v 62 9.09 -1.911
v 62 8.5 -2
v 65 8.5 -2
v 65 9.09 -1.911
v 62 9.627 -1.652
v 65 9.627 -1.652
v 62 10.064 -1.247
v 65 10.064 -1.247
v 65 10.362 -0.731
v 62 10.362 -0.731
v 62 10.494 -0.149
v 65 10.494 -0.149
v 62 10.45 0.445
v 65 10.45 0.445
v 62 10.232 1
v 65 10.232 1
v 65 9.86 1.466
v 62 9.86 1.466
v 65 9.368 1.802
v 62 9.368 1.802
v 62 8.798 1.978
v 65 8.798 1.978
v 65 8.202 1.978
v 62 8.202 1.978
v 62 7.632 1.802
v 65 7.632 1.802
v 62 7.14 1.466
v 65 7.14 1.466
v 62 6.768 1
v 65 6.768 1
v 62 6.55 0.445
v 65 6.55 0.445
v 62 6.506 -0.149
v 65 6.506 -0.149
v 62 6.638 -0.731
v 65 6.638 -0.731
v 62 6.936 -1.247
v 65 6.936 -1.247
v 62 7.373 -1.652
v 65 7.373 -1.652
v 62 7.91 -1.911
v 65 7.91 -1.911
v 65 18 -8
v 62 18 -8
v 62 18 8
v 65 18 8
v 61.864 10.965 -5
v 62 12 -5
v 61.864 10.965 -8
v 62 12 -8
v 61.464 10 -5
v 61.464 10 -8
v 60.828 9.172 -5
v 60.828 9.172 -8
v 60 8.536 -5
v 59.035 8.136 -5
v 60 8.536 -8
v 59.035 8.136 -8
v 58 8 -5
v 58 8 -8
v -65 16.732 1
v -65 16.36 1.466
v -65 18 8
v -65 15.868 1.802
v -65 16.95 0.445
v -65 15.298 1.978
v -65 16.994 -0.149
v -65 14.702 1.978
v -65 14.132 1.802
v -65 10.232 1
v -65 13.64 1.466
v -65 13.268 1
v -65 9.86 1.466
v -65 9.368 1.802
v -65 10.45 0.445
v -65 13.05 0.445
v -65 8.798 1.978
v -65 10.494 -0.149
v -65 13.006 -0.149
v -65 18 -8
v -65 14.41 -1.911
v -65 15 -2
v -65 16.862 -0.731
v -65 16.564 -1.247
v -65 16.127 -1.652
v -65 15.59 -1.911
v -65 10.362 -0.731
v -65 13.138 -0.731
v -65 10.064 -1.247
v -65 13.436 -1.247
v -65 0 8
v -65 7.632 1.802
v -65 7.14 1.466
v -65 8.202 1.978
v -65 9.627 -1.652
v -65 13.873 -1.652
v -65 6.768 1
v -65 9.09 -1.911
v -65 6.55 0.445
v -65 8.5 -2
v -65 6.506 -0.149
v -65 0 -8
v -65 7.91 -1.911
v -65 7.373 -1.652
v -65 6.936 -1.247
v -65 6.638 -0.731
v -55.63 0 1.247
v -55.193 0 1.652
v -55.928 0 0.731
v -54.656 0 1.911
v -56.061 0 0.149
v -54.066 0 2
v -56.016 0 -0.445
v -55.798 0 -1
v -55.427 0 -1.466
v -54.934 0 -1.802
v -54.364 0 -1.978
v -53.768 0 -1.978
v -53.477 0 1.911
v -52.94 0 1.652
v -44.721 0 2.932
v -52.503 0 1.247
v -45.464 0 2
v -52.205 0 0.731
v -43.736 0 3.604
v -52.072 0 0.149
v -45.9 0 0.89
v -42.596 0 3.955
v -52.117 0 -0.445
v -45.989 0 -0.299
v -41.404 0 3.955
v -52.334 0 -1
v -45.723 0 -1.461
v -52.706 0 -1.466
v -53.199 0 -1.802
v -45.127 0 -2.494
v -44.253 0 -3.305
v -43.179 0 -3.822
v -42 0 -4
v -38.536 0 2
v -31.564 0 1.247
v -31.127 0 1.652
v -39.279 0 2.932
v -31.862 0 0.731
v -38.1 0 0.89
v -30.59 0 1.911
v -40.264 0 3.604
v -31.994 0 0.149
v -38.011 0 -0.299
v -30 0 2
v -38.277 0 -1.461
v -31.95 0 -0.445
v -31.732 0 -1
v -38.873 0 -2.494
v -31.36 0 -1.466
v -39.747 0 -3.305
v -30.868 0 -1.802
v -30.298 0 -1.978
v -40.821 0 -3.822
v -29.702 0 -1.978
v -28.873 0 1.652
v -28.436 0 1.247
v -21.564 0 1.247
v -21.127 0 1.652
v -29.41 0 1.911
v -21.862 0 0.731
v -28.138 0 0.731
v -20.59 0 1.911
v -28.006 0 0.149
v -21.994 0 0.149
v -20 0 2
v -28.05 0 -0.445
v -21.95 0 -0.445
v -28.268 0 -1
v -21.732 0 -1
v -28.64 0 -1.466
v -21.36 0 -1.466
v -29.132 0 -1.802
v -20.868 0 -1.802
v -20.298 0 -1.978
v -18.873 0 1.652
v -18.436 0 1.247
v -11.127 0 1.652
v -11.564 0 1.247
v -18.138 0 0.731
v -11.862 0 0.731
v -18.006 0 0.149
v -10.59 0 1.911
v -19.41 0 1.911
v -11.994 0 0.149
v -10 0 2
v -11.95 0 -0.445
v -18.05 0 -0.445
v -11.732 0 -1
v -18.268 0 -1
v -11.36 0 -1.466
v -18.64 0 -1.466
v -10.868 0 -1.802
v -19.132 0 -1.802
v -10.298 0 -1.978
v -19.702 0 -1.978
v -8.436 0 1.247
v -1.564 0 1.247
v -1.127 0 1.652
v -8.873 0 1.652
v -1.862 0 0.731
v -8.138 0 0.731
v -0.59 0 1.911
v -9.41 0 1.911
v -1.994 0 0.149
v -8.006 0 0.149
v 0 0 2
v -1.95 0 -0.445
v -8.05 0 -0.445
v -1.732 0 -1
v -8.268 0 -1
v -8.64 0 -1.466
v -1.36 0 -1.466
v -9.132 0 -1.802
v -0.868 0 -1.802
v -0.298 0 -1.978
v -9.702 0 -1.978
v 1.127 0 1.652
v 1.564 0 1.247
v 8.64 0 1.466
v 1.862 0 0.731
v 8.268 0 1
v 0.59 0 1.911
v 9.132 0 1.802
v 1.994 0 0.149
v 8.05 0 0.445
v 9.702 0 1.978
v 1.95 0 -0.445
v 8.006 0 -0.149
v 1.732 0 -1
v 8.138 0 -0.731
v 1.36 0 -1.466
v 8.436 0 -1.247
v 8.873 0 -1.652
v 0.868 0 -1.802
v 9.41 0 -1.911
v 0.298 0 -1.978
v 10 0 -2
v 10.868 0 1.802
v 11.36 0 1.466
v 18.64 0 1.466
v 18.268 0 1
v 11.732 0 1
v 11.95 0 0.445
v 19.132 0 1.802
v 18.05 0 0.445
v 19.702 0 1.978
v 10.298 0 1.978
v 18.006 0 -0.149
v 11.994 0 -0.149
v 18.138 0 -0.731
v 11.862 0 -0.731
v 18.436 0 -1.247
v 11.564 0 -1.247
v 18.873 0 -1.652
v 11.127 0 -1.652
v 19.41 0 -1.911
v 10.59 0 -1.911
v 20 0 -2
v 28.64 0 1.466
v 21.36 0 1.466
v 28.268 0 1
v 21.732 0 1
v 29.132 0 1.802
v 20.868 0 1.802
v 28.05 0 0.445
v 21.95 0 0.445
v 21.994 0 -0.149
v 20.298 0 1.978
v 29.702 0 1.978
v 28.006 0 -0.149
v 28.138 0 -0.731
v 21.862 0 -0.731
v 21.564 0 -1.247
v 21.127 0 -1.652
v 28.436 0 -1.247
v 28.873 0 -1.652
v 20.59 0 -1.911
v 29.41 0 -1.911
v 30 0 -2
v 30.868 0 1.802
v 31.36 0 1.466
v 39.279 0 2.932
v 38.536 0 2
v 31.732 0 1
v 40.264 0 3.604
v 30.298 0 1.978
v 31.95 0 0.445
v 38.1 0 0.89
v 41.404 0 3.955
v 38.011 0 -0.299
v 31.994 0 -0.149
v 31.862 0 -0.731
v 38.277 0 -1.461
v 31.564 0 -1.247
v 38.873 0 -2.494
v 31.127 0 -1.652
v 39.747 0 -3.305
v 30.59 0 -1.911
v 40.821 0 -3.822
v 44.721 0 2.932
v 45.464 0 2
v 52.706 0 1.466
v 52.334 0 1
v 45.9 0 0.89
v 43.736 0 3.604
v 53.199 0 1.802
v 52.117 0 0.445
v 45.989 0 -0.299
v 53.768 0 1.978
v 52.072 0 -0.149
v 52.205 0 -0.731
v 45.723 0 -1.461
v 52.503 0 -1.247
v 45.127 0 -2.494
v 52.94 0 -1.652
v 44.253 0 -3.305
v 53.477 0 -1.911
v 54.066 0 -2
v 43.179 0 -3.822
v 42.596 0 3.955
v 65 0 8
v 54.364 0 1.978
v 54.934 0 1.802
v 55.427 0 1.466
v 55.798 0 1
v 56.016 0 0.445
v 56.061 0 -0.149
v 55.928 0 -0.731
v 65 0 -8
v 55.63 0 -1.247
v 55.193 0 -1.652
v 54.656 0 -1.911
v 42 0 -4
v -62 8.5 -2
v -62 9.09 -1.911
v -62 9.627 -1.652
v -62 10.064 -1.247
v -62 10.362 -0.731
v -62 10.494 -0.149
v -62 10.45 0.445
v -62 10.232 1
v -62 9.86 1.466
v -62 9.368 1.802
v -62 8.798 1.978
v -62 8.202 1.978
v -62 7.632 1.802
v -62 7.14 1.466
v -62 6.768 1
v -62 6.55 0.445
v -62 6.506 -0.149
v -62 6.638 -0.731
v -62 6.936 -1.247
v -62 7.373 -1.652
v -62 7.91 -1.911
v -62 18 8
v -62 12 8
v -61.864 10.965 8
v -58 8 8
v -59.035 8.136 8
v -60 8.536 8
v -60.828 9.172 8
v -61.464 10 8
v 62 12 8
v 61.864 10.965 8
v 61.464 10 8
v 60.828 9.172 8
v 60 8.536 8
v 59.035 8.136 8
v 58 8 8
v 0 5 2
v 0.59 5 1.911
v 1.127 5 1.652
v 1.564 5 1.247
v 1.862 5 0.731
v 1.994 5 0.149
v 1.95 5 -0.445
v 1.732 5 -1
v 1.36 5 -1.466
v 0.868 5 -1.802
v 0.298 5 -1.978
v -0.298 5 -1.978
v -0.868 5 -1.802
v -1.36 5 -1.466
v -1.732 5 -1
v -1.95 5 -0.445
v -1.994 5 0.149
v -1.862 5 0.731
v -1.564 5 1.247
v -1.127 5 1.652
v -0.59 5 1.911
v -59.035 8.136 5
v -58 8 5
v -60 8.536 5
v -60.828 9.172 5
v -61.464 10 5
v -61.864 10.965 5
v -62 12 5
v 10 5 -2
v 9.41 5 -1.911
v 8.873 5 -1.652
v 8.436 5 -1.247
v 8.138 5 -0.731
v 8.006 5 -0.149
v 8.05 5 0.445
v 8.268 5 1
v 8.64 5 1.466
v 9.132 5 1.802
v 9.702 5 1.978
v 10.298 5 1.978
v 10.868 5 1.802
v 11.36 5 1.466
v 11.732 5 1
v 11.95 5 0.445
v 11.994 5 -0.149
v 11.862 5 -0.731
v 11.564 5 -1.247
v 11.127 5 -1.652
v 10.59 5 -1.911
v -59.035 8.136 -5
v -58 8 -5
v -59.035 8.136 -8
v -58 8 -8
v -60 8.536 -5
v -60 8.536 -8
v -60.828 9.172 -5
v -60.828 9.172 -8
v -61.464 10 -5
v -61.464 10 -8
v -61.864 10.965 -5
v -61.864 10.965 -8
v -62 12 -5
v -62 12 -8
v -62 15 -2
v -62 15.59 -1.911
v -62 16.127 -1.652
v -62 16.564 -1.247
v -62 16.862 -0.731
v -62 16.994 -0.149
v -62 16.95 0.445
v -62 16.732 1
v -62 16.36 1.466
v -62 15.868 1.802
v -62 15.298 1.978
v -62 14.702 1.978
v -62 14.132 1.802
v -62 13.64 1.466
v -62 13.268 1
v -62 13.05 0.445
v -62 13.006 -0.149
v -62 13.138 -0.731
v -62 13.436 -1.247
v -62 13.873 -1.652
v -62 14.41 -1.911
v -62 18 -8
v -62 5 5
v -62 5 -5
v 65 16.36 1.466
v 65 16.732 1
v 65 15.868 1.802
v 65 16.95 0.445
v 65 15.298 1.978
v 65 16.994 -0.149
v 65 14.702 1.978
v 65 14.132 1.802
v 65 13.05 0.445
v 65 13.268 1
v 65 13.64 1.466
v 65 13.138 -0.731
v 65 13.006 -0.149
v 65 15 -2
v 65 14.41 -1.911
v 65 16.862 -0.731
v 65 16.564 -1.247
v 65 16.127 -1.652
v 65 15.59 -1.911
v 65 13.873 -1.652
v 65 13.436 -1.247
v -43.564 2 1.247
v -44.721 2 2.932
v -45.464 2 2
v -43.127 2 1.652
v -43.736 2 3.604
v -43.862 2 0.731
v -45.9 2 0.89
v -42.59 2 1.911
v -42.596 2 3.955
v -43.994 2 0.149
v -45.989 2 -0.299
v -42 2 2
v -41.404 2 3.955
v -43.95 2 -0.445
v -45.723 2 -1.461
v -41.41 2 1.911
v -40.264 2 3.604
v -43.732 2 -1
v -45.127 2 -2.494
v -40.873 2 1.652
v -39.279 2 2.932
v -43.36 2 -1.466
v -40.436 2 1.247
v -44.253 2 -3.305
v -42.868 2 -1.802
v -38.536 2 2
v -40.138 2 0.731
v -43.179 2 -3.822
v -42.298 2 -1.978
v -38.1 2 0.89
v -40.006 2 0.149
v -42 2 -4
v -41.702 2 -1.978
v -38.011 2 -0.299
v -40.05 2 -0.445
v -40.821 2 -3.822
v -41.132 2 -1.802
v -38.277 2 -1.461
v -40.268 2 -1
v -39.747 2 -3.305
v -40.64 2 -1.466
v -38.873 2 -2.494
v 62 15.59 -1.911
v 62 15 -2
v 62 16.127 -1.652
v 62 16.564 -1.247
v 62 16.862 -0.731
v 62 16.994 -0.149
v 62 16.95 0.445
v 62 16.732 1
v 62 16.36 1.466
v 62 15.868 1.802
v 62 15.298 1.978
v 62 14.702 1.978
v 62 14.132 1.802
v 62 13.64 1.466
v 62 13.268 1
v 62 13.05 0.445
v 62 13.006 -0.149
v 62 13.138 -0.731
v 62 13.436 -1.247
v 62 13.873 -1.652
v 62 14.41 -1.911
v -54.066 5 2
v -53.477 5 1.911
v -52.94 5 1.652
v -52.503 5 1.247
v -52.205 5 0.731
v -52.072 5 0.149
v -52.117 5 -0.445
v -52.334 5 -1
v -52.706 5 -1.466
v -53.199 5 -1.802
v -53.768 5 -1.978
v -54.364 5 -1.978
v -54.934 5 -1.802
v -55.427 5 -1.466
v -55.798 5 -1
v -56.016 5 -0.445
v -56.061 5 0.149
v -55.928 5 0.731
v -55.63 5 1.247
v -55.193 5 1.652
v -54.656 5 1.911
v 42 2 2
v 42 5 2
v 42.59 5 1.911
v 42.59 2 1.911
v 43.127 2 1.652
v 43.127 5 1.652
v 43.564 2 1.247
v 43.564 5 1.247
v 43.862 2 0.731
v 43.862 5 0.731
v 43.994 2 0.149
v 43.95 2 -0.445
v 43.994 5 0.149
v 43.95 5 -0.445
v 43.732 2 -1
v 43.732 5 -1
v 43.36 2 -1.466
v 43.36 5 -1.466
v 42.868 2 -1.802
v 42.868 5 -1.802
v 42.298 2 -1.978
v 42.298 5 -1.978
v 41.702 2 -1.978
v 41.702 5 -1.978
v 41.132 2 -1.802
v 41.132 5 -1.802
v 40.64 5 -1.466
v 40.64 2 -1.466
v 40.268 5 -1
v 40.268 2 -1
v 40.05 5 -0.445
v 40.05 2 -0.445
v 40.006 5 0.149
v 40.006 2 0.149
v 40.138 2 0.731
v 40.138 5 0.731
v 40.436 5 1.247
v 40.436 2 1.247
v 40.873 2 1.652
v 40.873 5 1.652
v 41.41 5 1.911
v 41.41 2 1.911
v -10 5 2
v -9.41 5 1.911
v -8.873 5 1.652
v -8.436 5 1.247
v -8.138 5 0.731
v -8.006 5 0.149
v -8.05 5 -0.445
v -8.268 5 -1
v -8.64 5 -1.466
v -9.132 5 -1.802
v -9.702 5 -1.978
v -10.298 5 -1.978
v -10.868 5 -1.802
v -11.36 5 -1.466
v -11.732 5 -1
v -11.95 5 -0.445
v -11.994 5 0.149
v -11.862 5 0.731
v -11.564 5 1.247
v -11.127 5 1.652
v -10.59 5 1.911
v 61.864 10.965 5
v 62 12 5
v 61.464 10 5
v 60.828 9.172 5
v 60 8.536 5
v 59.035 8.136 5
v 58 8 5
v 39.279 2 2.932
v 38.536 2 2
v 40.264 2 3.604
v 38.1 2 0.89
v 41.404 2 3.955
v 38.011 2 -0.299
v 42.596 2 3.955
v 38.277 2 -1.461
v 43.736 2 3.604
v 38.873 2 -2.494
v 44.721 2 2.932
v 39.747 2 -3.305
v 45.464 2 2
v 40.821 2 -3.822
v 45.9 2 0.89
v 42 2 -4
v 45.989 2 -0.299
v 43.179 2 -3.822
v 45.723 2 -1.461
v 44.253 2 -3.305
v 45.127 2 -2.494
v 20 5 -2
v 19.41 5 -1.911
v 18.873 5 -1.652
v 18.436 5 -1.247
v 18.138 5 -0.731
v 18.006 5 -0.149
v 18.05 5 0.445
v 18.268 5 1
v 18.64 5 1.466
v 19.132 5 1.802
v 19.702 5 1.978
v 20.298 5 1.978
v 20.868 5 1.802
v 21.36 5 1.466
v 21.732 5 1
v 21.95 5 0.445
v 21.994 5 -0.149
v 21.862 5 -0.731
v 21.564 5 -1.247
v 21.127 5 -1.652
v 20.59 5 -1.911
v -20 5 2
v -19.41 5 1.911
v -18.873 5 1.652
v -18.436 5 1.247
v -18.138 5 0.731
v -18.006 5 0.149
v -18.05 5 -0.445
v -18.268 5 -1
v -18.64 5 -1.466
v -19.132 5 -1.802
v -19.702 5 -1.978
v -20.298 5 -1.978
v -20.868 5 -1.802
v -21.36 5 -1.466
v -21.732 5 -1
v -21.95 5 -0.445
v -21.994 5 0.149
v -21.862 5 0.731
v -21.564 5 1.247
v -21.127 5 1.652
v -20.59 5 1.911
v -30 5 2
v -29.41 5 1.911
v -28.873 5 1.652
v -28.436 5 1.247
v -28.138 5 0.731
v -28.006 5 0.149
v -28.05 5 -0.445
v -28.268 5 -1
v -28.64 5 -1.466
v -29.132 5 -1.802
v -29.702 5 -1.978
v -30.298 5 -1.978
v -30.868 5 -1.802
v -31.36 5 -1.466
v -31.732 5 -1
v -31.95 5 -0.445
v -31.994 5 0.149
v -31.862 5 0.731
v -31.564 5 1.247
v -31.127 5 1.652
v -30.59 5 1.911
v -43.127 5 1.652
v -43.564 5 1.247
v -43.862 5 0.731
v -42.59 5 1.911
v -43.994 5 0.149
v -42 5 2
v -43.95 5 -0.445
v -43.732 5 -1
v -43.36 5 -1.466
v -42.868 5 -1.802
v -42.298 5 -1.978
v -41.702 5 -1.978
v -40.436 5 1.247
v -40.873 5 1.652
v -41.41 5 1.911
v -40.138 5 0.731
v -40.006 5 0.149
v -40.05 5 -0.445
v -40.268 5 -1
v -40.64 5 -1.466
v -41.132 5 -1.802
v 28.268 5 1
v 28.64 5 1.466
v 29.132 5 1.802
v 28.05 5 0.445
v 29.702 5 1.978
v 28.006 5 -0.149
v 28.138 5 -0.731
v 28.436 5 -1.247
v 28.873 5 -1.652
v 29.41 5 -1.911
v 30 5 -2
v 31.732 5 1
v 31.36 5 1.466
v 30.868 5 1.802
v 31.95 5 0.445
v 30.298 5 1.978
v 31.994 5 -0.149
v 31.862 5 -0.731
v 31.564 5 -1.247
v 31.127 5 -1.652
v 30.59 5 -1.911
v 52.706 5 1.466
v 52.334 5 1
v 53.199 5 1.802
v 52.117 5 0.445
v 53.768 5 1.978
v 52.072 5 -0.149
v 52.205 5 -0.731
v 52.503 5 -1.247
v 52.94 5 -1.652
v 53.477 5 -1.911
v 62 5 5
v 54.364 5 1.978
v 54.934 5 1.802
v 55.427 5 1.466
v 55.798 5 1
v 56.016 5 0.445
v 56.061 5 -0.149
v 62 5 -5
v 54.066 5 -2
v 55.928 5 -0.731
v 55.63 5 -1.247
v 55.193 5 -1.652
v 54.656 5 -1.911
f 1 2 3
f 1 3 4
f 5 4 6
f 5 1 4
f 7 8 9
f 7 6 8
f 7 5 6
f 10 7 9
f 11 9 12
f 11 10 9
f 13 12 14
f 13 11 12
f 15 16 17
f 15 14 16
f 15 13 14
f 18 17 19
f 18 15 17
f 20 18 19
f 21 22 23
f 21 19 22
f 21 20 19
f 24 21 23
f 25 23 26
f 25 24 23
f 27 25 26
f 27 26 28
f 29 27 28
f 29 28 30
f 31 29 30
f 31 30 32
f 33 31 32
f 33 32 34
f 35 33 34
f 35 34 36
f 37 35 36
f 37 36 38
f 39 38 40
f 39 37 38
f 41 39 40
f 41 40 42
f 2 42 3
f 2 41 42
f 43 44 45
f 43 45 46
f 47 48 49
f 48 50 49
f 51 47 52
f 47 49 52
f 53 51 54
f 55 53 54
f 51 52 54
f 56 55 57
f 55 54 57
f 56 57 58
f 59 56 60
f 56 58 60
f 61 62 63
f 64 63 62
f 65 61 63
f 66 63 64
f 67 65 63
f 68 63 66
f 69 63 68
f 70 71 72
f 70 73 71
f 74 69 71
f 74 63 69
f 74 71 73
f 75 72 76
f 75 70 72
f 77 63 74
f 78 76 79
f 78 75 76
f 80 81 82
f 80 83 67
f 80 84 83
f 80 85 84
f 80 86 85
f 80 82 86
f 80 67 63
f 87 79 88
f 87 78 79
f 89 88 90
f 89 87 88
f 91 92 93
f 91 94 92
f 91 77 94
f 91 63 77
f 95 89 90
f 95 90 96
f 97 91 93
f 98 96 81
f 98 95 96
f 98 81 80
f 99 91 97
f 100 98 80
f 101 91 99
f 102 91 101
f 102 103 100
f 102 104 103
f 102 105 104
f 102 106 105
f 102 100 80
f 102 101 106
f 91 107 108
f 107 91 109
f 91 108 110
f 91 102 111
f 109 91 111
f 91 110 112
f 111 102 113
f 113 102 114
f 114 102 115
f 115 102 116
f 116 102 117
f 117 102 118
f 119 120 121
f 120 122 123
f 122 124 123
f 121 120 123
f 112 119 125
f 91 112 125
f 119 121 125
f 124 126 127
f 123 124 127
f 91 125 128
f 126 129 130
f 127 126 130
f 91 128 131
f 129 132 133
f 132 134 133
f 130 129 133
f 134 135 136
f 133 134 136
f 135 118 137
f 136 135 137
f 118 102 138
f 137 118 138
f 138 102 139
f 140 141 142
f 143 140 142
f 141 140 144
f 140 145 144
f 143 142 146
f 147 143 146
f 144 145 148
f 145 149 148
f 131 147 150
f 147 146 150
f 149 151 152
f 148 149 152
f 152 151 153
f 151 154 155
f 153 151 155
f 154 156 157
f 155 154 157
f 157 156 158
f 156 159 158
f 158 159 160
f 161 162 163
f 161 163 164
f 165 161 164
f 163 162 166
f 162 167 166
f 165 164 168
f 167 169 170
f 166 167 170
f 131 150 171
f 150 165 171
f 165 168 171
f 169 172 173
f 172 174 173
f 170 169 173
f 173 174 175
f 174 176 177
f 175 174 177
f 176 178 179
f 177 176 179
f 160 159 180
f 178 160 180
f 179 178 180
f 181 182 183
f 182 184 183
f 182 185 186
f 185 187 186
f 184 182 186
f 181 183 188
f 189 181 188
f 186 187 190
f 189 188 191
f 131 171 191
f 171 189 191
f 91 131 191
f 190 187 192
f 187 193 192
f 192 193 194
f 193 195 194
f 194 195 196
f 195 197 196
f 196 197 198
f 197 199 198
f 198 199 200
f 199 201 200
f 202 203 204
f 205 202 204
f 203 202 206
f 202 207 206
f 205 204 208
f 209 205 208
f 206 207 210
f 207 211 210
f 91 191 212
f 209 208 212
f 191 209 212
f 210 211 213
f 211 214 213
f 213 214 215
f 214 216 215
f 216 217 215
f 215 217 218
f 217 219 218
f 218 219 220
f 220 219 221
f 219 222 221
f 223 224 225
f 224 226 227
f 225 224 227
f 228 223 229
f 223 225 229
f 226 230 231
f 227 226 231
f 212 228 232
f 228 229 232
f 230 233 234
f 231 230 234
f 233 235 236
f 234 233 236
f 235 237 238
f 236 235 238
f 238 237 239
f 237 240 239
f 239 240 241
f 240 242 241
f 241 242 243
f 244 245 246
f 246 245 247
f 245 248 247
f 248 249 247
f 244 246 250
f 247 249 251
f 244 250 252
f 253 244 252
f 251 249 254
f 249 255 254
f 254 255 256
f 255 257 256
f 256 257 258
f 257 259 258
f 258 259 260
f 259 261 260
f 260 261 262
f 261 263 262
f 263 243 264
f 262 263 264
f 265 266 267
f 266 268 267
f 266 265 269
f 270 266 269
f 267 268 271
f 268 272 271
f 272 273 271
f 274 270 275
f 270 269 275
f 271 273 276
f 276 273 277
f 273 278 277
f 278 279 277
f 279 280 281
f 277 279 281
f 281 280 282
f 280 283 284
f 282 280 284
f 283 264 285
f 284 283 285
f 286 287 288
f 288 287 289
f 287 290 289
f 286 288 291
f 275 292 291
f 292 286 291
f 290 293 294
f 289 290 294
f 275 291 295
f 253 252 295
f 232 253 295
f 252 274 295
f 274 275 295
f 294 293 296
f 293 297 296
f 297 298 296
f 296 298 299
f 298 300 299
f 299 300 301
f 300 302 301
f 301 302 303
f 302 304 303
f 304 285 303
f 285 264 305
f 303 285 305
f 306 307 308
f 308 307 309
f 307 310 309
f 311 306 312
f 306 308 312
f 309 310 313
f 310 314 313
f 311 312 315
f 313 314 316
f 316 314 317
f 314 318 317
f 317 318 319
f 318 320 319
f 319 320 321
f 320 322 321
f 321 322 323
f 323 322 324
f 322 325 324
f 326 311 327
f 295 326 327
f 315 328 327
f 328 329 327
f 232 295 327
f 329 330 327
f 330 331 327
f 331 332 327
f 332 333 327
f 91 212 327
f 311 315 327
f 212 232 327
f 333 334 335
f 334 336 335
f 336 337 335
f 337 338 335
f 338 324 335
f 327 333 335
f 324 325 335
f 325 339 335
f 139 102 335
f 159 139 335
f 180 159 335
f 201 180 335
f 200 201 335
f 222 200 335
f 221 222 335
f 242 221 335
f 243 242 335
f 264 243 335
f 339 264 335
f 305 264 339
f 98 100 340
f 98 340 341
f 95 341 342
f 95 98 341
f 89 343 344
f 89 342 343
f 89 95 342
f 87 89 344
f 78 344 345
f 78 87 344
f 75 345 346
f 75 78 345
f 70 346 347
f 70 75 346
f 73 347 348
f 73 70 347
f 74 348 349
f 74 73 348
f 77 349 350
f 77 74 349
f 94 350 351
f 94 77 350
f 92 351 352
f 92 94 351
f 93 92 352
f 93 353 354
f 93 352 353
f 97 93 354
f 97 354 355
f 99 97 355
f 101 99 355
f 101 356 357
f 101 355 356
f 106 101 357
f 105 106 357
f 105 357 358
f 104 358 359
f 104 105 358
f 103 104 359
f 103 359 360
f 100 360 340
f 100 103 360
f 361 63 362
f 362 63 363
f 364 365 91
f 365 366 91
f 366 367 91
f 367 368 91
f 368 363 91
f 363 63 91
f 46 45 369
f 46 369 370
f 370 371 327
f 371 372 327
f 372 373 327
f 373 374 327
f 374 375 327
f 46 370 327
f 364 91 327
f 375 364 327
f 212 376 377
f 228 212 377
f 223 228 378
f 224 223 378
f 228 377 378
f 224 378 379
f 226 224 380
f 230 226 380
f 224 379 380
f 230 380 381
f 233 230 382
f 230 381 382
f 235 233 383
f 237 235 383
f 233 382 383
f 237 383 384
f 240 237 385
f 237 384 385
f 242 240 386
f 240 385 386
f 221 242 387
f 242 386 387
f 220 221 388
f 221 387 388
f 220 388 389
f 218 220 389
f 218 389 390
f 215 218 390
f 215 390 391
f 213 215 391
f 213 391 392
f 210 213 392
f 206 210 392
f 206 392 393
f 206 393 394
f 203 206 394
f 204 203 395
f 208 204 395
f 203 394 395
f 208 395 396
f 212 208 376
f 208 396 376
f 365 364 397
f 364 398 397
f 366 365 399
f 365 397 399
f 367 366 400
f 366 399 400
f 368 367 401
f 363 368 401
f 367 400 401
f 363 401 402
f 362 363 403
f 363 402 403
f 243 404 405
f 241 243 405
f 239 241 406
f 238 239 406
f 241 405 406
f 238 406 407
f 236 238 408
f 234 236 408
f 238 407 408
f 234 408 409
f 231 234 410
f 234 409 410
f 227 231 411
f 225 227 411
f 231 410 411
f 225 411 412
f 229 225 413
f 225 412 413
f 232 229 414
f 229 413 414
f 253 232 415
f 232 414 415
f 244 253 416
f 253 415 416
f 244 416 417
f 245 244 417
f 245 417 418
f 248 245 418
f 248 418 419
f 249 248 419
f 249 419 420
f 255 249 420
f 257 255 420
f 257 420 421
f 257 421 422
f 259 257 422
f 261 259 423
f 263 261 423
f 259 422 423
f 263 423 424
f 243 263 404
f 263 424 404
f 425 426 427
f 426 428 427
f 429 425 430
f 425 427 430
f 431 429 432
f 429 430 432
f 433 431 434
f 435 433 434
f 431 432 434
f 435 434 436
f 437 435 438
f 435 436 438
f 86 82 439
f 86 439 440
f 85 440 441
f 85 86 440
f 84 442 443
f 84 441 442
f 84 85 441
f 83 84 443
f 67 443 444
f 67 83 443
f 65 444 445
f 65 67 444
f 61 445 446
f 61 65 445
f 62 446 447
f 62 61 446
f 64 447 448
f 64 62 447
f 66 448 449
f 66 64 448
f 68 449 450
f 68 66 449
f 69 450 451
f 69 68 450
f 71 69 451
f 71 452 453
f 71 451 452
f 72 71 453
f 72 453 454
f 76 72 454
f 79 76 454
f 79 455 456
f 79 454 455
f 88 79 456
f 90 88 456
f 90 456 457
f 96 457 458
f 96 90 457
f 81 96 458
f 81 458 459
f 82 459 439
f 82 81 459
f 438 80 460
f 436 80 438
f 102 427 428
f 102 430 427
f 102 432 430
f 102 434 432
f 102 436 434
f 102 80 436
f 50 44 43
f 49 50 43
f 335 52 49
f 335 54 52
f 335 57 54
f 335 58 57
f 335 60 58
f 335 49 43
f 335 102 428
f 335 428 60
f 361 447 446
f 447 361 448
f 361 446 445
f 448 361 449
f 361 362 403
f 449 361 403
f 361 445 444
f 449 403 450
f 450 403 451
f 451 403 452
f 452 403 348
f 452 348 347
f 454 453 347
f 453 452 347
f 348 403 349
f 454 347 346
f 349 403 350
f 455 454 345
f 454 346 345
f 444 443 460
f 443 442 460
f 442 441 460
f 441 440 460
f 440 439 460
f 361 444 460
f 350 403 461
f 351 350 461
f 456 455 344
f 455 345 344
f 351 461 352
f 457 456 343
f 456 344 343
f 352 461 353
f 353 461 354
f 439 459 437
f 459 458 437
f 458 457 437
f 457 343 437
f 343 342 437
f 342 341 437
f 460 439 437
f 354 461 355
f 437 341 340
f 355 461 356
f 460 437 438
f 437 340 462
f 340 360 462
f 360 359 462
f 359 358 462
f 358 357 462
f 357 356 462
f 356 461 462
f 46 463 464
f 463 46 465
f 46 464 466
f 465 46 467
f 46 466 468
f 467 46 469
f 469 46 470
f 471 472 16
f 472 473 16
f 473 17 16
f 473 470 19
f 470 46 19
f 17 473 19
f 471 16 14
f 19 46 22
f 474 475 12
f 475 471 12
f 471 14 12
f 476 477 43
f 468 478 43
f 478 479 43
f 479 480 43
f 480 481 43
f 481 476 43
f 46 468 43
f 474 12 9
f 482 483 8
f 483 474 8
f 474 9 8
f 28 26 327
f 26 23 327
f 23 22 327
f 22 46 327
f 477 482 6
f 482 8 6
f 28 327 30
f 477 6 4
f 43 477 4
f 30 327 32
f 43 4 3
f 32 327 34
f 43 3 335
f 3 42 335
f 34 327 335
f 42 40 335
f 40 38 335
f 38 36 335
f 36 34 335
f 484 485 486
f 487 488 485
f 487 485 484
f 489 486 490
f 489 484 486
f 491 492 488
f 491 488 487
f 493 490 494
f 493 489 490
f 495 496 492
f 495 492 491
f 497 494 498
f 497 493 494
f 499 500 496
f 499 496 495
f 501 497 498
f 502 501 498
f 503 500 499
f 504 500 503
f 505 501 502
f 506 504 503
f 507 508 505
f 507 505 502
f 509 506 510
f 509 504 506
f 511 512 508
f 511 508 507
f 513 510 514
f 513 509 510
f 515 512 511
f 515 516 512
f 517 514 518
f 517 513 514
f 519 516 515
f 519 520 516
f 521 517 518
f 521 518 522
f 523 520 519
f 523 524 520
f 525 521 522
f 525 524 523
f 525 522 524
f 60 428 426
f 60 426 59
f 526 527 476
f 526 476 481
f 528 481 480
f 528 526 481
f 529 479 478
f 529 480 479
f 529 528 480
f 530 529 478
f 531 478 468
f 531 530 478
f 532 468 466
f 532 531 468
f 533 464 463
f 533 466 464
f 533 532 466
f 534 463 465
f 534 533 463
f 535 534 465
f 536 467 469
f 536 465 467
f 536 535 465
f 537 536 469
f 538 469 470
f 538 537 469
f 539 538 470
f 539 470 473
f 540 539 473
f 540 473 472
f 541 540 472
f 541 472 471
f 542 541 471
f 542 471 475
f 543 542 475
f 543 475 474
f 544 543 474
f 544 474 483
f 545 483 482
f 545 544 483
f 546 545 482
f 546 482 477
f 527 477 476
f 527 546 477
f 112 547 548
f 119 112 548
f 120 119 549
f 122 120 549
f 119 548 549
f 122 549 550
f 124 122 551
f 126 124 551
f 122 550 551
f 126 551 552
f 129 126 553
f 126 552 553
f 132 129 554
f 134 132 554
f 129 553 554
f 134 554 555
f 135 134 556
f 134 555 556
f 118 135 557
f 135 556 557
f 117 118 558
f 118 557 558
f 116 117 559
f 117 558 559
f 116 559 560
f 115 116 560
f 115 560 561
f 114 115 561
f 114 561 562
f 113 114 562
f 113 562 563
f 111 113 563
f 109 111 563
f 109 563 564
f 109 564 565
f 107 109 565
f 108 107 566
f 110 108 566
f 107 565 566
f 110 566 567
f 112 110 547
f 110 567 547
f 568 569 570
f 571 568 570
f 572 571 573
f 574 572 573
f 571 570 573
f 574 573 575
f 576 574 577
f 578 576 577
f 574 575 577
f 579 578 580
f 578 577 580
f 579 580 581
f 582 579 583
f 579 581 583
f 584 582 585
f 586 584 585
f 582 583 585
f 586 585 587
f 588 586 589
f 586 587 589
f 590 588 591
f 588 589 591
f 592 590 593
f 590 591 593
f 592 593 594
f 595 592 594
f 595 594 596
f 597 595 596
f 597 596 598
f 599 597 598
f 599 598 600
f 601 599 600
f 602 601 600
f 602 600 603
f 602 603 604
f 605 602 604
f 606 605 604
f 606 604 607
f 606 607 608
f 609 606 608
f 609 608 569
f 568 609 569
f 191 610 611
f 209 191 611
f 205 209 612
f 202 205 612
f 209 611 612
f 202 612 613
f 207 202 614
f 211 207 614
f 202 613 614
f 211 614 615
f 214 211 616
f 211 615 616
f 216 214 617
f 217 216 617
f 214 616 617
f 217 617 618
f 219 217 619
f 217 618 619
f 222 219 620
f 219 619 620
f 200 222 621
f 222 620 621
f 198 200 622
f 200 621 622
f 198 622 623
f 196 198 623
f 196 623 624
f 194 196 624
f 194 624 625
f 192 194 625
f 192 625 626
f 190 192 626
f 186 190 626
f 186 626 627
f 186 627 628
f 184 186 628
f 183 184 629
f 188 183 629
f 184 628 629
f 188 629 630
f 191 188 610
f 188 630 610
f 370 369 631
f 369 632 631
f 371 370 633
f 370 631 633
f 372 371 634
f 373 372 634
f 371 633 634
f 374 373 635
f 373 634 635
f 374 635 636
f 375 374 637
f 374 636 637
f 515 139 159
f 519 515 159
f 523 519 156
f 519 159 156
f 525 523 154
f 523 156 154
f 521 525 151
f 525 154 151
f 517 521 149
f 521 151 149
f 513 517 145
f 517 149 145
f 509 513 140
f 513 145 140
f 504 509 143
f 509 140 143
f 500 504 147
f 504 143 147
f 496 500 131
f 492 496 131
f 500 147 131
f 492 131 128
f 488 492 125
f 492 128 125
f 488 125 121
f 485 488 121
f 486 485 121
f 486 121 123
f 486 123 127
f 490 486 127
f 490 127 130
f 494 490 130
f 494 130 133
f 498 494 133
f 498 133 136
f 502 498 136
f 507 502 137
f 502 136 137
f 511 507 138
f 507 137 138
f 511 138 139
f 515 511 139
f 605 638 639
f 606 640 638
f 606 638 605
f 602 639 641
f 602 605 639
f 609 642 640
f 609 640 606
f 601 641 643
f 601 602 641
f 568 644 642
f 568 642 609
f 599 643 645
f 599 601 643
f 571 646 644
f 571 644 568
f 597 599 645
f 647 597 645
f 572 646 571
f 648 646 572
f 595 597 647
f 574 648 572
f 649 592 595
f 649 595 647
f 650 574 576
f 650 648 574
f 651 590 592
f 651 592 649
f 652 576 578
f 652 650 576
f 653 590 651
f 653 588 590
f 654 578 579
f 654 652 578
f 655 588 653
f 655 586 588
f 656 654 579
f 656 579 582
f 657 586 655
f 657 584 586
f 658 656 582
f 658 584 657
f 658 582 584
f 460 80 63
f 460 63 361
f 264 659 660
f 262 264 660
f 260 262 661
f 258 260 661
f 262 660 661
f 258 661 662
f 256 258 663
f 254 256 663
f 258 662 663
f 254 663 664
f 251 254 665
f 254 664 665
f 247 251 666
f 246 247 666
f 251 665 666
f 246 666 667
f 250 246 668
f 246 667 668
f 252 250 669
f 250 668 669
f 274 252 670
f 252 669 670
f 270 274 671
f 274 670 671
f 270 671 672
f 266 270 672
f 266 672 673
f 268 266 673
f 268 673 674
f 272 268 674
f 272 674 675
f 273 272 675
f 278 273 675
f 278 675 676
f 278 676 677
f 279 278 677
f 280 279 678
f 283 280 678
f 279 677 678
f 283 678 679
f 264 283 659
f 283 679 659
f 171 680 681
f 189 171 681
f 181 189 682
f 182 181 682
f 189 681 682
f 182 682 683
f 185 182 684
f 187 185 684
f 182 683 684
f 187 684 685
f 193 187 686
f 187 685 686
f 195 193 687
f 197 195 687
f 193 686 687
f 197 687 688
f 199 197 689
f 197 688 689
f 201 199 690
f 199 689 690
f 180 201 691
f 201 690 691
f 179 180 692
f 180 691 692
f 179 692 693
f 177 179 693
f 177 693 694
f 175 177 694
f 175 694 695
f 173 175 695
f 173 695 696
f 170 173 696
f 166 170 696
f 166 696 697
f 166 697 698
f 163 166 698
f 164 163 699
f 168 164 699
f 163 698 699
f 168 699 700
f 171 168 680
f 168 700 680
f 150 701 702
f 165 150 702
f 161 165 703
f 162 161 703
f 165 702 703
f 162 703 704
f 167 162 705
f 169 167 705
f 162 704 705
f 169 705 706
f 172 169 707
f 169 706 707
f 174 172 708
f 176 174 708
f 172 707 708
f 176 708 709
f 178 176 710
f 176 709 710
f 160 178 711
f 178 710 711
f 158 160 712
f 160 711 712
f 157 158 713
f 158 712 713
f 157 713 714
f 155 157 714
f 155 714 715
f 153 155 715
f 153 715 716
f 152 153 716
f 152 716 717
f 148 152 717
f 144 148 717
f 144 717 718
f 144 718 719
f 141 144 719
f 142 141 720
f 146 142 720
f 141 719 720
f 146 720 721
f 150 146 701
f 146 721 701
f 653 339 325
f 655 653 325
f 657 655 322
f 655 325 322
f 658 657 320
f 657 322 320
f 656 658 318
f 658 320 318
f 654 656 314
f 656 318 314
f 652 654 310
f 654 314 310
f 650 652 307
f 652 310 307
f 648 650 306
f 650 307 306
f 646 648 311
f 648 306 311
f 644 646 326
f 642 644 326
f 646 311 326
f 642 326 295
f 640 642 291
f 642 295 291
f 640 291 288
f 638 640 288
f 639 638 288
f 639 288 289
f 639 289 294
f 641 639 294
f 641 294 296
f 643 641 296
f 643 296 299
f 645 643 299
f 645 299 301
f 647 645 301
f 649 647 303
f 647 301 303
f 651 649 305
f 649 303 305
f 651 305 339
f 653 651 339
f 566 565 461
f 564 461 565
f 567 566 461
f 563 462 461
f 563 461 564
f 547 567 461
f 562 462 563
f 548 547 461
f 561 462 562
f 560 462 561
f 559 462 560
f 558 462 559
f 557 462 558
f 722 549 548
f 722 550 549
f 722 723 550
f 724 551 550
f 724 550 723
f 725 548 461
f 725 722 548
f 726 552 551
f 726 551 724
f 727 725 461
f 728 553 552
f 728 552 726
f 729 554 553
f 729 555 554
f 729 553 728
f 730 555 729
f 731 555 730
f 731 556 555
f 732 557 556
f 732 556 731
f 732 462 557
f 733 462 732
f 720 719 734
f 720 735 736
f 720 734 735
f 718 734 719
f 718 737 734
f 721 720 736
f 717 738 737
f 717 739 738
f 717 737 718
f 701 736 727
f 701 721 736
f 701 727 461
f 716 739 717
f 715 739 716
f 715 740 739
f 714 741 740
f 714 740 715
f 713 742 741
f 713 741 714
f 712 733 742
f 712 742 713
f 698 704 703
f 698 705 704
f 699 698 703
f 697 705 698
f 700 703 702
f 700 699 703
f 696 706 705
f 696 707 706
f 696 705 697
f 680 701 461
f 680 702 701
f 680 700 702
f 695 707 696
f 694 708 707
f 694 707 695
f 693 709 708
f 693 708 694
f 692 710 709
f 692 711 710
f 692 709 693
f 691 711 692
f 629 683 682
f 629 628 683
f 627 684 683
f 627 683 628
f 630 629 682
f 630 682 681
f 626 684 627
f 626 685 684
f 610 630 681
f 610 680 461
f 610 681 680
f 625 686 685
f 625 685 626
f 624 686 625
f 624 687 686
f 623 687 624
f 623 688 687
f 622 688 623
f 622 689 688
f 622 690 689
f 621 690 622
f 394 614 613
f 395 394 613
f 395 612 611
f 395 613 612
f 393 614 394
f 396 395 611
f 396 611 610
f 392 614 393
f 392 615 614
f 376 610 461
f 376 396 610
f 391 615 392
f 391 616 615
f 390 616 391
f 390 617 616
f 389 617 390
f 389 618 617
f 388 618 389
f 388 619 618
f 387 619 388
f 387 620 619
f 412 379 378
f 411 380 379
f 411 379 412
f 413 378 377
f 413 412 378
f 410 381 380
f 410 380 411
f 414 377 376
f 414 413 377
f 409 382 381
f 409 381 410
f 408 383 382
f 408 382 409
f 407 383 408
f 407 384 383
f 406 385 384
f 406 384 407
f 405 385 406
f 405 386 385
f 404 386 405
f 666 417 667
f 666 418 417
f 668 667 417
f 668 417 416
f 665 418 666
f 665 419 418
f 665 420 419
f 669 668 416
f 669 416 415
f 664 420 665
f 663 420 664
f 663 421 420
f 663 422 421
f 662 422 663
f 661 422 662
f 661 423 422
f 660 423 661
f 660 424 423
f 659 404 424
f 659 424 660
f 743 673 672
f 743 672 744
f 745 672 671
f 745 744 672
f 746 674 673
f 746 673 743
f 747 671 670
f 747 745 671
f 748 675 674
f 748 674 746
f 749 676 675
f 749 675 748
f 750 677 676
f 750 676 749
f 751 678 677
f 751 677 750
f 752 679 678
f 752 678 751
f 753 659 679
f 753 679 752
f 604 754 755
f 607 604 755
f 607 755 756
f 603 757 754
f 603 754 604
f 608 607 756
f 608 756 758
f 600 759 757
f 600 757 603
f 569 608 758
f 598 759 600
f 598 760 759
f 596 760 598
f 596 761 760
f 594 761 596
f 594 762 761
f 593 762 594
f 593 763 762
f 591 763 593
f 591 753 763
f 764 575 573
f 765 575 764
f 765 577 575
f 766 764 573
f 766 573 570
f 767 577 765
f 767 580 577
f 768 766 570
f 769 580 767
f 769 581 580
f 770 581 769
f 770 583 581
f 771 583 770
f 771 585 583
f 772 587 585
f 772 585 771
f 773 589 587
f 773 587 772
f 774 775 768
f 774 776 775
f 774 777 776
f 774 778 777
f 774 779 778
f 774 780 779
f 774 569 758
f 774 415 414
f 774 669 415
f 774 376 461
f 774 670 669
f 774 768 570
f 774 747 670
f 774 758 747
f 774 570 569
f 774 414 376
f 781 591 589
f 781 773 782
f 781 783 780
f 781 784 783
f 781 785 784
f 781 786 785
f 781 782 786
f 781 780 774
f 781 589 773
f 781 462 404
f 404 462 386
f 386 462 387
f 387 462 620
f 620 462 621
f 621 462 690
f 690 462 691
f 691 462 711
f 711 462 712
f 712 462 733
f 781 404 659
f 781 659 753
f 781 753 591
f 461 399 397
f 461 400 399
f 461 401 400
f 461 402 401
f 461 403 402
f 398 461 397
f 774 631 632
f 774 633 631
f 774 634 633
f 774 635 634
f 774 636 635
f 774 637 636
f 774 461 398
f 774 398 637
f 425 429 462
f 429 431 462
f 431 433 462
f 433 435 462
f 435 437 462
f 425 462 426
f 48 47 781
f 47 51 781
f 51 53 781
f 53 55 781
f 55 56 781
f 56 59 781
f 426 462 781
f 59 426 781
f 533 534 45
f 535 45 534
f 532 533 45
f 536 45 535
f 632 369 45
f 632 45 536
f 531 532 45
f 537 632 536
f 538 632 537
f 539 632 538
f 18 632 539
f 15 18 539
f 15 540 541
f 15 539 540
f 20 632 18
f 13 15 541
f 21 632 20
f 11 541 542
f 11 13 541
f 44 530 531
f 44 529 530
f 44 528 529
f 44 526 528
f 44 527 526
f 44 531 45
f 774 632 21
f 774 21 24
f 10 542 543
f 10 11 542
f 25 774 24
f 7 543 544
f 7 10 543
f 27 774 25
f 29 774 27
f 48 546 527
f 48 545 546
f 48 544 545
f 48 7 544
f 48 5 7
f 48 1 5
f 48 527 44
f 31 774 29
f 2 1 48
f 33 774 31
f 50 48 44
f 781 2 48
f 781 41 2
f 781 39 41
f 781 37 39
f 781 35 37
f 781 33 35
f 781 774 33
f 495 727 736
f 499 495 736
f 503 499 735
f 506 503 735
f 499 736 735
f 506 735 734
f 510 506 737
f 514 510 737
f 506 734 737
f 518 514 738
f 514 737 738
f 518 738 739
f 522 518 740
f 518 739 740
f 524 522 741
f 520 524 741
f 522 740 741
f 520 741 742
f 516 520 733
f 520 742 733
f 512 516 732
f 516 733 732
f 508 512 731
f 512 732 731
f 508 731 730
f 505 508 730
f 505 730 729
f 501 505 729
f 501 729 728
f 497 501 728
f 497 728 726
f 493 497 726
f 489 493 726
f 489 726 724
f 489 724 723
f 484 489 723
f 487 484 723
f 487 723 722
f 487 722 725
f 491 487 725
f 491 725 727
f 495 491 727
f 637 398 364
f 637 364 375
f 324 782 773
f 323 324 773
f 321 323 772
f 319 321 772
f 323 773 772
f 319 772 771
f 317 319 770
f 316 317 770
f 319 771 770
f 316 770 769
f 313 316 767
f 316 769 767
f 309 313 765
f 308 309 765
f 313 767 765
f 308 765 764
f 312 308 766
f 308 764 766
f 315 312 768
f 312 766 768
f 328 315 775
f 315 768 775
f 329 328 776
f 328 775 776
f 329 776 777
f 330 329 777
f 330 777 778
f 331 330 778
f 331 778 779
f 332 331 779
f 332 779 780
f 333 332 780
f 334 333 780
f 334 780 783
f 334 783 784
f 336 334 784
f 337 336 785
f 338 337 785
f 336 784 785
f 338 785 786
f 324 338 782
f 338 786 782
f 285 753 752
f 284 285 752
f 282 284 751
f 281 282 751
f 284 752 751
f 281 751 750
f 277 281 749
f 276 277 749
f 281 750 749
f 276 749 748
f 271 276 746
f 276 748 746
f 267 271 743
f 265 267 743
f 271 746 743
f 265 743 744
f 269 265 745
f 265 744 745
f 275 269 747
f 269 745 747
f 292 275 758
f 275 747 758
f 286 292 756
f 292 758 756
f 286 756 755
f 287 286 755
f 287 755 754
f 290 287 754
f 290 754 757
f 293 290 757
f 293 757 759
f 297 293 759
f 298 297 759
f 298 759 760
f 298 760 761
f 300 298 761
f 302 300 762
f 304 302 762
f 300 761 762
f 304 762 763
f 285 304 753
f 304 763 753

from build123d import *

# Parameters (mm, degrees)
SKETCH1_W               = 130
SKETCH1_H               = 16
BOSS_EXTRUDE1_DEPTH     = 5
SKETCH2_W               = 130
SKETCH2_H               = 16
SKETCH2_W_2             = 124
SKETCH2_H_2             = 10
BOSS_EXTRUDE2_DEPTH     = 3
SKETCH3_W               = 3
SKETCH3_H               = 16
BOSS_EXTRUDE3_DEPTH     = 10
FILLET1_R               = 4
SKETCH4_R               = 2
CUT_EXTRUDE1_DEPTH      = 10
SKETCH6_R               = 4
CUT_EXTRUDE2_DEPTH      = 2
SKETCH7_R               = 2
CUT_EXTRUDE3_DEPTH      = 5
CUT_EXTRUDE4_DEPTH      = 129.518481161
CUT_EXTRUDE4_DEPTH_BACK = 129.518481161
SKETCH8_R               = 2


with BuildPart() as part:
    # Sketch1 → Boss-Extrude1 (new body)
    with BuildSketch(Plane(origin=(0, 0, 0), x_dir=(1, 0, 0), z_dir=(0, 1, 0))):
        Rectangle(SKETCH1_W, SKETCH1_H)
    extrude(amount=BOSS_EXTRUDE1_DEPTH)

    # Sketch2 → Boss-Extrude2 (add)
    with BuildSketch(Plane(origin=(0, 5, 0), x_dir=(1, 0, 0), z_dir=(0, 1, 0))):
        Rectangle(SKETCH2_W, SKETCH2_H)
        Rectangle(SKETCH2_W_2, SKETCH2_H_2, mode=Mode.SUBTRACT)
    extrude(amount=BOSS_EXTRUDE2_DEPTH)

    # Sketch3 → Boss-Extrude3 (add)
    with BuildSketch(Plane(origin=(0, 8, 0), x_dir=(1, 0, 0), z_dir=(0, 1, 0))):
        with Locations((-63.5, 0)):
            Rectangle(SKETCH3_W, SKETCH3_H)
        with Locations((63.5, 0)):
            Rectangle(SKETCH3_W, SKETCH3_H)
    extrude(amount=BOSS_EXTRUDE3_DEPTH)

    # Fillet1
    fillet1_edges = [part.edges().sort_by_distance(p)[0] for p in [
        (-62, 8, -6.5),
        (-62, 8, 6.5),
        (62, 8, -6.5),
        (62, 8, 6.5),
    ]]
    fillet(fillet1_edges, radius=FILLET1_R)

    # Sketch4 → Cut-Extrude1 (cut)
    with BuildSketch(Plane(origin=(0, 5, 0), x_dir=(1, 0, 0), z_dir=(0, 1, 0))):
        with Locations(Location((42, 0, 0), (0, 0, 270))):
            Circle(SKETCH4_R)
        with Locations(Location((-42, 0, 0), (0, 0, 270))):
            Circle(SKETCH4_R)
    extrude(amount=-CUT_EXTRUDE1_DEPTH, mode=Mode.SUBTRACT)

    # Sketch6 → Cut-Extrude2 (cut)
    with BuildSketch(Plane.XZ):
        with Locations(Location((42, 0, 0), (0, 0, 270))):
            Circle(SKETCH6_R)
        with Locations(Location((-42, 0, 0), (0, 0, 270))):
            Circle(SKETCH6_R)
    extrude(amount=-CUT_EXTRUDE2_DEPTH, mode=Mode.SUBTRACT)

    # Sketch7 → Cut-Extrude3 (cut)
    with BuildSketch(Plane(origin=(0, 5, 0), x_dir=(1, 0, 0), z_dir=(0, 1, 0))):
        with Locations(Location((0, 0, 0), (0, 0, 270))):
            Circle(SKETCH7_R)
        with Locations(Location((-10, 0, 0), (0, 0, 270))):
            Circle(SKETCH7_R)
        with Locations(Location((-20, 0, 0), (0, 0, 270))):
            Circle(SKETCH7_R)
        with Locations(Location((-30, 0, 0), (0, 0, 270))):
            Circle(SKETCH7_R)
        with Locations(Location((-54.066395838, 0, 0), (0, 0, 270))):
            Circle(SKETCH7_R)
        with Locations(Location((54.066395838, 0, 0), (0, 0, 90))):
            Circle(SKETCH7_R)
        with Locations(Location((30, 0, 0), (0, 0, 90))):
            Circle(SKETCH7_R)
        with Locations(Location((20, 0, 0), (0, 0, 90))):
            Circle(SKETCH7_R)
        with Locations(Location((10, 0, 0), (0, 0, 90))):
            Circle(SKETCH7_R)
    extrude(amount=-CUT_EXTRUDE3_DEPTH, mode=Mode.SUBTRACT)

    # Sketch8 → Cut-Extrude4 (cut, two sides: drawn at the far end of the back side and taken through both)
    with BuildSketch(Plane(origin=(-62, 0, 0), x_dir=(0, 0, -1), z_dir=(1, 0, 0)).offset(-CUT_EXTRUDE4_DEPTH_BACK)):
        with Locations((0, 8.5)):
            Circle(SKETCH8_R)
        with Locations((0, 15)):
            Circle(SKETCH8_R)
    extrude(amount=CUT_EXTRUDE4_DEPTH + CUT_EXTRUDE4_DEPTH_BACK, mode=Mode.SUBTRACT)


solid = part.part
